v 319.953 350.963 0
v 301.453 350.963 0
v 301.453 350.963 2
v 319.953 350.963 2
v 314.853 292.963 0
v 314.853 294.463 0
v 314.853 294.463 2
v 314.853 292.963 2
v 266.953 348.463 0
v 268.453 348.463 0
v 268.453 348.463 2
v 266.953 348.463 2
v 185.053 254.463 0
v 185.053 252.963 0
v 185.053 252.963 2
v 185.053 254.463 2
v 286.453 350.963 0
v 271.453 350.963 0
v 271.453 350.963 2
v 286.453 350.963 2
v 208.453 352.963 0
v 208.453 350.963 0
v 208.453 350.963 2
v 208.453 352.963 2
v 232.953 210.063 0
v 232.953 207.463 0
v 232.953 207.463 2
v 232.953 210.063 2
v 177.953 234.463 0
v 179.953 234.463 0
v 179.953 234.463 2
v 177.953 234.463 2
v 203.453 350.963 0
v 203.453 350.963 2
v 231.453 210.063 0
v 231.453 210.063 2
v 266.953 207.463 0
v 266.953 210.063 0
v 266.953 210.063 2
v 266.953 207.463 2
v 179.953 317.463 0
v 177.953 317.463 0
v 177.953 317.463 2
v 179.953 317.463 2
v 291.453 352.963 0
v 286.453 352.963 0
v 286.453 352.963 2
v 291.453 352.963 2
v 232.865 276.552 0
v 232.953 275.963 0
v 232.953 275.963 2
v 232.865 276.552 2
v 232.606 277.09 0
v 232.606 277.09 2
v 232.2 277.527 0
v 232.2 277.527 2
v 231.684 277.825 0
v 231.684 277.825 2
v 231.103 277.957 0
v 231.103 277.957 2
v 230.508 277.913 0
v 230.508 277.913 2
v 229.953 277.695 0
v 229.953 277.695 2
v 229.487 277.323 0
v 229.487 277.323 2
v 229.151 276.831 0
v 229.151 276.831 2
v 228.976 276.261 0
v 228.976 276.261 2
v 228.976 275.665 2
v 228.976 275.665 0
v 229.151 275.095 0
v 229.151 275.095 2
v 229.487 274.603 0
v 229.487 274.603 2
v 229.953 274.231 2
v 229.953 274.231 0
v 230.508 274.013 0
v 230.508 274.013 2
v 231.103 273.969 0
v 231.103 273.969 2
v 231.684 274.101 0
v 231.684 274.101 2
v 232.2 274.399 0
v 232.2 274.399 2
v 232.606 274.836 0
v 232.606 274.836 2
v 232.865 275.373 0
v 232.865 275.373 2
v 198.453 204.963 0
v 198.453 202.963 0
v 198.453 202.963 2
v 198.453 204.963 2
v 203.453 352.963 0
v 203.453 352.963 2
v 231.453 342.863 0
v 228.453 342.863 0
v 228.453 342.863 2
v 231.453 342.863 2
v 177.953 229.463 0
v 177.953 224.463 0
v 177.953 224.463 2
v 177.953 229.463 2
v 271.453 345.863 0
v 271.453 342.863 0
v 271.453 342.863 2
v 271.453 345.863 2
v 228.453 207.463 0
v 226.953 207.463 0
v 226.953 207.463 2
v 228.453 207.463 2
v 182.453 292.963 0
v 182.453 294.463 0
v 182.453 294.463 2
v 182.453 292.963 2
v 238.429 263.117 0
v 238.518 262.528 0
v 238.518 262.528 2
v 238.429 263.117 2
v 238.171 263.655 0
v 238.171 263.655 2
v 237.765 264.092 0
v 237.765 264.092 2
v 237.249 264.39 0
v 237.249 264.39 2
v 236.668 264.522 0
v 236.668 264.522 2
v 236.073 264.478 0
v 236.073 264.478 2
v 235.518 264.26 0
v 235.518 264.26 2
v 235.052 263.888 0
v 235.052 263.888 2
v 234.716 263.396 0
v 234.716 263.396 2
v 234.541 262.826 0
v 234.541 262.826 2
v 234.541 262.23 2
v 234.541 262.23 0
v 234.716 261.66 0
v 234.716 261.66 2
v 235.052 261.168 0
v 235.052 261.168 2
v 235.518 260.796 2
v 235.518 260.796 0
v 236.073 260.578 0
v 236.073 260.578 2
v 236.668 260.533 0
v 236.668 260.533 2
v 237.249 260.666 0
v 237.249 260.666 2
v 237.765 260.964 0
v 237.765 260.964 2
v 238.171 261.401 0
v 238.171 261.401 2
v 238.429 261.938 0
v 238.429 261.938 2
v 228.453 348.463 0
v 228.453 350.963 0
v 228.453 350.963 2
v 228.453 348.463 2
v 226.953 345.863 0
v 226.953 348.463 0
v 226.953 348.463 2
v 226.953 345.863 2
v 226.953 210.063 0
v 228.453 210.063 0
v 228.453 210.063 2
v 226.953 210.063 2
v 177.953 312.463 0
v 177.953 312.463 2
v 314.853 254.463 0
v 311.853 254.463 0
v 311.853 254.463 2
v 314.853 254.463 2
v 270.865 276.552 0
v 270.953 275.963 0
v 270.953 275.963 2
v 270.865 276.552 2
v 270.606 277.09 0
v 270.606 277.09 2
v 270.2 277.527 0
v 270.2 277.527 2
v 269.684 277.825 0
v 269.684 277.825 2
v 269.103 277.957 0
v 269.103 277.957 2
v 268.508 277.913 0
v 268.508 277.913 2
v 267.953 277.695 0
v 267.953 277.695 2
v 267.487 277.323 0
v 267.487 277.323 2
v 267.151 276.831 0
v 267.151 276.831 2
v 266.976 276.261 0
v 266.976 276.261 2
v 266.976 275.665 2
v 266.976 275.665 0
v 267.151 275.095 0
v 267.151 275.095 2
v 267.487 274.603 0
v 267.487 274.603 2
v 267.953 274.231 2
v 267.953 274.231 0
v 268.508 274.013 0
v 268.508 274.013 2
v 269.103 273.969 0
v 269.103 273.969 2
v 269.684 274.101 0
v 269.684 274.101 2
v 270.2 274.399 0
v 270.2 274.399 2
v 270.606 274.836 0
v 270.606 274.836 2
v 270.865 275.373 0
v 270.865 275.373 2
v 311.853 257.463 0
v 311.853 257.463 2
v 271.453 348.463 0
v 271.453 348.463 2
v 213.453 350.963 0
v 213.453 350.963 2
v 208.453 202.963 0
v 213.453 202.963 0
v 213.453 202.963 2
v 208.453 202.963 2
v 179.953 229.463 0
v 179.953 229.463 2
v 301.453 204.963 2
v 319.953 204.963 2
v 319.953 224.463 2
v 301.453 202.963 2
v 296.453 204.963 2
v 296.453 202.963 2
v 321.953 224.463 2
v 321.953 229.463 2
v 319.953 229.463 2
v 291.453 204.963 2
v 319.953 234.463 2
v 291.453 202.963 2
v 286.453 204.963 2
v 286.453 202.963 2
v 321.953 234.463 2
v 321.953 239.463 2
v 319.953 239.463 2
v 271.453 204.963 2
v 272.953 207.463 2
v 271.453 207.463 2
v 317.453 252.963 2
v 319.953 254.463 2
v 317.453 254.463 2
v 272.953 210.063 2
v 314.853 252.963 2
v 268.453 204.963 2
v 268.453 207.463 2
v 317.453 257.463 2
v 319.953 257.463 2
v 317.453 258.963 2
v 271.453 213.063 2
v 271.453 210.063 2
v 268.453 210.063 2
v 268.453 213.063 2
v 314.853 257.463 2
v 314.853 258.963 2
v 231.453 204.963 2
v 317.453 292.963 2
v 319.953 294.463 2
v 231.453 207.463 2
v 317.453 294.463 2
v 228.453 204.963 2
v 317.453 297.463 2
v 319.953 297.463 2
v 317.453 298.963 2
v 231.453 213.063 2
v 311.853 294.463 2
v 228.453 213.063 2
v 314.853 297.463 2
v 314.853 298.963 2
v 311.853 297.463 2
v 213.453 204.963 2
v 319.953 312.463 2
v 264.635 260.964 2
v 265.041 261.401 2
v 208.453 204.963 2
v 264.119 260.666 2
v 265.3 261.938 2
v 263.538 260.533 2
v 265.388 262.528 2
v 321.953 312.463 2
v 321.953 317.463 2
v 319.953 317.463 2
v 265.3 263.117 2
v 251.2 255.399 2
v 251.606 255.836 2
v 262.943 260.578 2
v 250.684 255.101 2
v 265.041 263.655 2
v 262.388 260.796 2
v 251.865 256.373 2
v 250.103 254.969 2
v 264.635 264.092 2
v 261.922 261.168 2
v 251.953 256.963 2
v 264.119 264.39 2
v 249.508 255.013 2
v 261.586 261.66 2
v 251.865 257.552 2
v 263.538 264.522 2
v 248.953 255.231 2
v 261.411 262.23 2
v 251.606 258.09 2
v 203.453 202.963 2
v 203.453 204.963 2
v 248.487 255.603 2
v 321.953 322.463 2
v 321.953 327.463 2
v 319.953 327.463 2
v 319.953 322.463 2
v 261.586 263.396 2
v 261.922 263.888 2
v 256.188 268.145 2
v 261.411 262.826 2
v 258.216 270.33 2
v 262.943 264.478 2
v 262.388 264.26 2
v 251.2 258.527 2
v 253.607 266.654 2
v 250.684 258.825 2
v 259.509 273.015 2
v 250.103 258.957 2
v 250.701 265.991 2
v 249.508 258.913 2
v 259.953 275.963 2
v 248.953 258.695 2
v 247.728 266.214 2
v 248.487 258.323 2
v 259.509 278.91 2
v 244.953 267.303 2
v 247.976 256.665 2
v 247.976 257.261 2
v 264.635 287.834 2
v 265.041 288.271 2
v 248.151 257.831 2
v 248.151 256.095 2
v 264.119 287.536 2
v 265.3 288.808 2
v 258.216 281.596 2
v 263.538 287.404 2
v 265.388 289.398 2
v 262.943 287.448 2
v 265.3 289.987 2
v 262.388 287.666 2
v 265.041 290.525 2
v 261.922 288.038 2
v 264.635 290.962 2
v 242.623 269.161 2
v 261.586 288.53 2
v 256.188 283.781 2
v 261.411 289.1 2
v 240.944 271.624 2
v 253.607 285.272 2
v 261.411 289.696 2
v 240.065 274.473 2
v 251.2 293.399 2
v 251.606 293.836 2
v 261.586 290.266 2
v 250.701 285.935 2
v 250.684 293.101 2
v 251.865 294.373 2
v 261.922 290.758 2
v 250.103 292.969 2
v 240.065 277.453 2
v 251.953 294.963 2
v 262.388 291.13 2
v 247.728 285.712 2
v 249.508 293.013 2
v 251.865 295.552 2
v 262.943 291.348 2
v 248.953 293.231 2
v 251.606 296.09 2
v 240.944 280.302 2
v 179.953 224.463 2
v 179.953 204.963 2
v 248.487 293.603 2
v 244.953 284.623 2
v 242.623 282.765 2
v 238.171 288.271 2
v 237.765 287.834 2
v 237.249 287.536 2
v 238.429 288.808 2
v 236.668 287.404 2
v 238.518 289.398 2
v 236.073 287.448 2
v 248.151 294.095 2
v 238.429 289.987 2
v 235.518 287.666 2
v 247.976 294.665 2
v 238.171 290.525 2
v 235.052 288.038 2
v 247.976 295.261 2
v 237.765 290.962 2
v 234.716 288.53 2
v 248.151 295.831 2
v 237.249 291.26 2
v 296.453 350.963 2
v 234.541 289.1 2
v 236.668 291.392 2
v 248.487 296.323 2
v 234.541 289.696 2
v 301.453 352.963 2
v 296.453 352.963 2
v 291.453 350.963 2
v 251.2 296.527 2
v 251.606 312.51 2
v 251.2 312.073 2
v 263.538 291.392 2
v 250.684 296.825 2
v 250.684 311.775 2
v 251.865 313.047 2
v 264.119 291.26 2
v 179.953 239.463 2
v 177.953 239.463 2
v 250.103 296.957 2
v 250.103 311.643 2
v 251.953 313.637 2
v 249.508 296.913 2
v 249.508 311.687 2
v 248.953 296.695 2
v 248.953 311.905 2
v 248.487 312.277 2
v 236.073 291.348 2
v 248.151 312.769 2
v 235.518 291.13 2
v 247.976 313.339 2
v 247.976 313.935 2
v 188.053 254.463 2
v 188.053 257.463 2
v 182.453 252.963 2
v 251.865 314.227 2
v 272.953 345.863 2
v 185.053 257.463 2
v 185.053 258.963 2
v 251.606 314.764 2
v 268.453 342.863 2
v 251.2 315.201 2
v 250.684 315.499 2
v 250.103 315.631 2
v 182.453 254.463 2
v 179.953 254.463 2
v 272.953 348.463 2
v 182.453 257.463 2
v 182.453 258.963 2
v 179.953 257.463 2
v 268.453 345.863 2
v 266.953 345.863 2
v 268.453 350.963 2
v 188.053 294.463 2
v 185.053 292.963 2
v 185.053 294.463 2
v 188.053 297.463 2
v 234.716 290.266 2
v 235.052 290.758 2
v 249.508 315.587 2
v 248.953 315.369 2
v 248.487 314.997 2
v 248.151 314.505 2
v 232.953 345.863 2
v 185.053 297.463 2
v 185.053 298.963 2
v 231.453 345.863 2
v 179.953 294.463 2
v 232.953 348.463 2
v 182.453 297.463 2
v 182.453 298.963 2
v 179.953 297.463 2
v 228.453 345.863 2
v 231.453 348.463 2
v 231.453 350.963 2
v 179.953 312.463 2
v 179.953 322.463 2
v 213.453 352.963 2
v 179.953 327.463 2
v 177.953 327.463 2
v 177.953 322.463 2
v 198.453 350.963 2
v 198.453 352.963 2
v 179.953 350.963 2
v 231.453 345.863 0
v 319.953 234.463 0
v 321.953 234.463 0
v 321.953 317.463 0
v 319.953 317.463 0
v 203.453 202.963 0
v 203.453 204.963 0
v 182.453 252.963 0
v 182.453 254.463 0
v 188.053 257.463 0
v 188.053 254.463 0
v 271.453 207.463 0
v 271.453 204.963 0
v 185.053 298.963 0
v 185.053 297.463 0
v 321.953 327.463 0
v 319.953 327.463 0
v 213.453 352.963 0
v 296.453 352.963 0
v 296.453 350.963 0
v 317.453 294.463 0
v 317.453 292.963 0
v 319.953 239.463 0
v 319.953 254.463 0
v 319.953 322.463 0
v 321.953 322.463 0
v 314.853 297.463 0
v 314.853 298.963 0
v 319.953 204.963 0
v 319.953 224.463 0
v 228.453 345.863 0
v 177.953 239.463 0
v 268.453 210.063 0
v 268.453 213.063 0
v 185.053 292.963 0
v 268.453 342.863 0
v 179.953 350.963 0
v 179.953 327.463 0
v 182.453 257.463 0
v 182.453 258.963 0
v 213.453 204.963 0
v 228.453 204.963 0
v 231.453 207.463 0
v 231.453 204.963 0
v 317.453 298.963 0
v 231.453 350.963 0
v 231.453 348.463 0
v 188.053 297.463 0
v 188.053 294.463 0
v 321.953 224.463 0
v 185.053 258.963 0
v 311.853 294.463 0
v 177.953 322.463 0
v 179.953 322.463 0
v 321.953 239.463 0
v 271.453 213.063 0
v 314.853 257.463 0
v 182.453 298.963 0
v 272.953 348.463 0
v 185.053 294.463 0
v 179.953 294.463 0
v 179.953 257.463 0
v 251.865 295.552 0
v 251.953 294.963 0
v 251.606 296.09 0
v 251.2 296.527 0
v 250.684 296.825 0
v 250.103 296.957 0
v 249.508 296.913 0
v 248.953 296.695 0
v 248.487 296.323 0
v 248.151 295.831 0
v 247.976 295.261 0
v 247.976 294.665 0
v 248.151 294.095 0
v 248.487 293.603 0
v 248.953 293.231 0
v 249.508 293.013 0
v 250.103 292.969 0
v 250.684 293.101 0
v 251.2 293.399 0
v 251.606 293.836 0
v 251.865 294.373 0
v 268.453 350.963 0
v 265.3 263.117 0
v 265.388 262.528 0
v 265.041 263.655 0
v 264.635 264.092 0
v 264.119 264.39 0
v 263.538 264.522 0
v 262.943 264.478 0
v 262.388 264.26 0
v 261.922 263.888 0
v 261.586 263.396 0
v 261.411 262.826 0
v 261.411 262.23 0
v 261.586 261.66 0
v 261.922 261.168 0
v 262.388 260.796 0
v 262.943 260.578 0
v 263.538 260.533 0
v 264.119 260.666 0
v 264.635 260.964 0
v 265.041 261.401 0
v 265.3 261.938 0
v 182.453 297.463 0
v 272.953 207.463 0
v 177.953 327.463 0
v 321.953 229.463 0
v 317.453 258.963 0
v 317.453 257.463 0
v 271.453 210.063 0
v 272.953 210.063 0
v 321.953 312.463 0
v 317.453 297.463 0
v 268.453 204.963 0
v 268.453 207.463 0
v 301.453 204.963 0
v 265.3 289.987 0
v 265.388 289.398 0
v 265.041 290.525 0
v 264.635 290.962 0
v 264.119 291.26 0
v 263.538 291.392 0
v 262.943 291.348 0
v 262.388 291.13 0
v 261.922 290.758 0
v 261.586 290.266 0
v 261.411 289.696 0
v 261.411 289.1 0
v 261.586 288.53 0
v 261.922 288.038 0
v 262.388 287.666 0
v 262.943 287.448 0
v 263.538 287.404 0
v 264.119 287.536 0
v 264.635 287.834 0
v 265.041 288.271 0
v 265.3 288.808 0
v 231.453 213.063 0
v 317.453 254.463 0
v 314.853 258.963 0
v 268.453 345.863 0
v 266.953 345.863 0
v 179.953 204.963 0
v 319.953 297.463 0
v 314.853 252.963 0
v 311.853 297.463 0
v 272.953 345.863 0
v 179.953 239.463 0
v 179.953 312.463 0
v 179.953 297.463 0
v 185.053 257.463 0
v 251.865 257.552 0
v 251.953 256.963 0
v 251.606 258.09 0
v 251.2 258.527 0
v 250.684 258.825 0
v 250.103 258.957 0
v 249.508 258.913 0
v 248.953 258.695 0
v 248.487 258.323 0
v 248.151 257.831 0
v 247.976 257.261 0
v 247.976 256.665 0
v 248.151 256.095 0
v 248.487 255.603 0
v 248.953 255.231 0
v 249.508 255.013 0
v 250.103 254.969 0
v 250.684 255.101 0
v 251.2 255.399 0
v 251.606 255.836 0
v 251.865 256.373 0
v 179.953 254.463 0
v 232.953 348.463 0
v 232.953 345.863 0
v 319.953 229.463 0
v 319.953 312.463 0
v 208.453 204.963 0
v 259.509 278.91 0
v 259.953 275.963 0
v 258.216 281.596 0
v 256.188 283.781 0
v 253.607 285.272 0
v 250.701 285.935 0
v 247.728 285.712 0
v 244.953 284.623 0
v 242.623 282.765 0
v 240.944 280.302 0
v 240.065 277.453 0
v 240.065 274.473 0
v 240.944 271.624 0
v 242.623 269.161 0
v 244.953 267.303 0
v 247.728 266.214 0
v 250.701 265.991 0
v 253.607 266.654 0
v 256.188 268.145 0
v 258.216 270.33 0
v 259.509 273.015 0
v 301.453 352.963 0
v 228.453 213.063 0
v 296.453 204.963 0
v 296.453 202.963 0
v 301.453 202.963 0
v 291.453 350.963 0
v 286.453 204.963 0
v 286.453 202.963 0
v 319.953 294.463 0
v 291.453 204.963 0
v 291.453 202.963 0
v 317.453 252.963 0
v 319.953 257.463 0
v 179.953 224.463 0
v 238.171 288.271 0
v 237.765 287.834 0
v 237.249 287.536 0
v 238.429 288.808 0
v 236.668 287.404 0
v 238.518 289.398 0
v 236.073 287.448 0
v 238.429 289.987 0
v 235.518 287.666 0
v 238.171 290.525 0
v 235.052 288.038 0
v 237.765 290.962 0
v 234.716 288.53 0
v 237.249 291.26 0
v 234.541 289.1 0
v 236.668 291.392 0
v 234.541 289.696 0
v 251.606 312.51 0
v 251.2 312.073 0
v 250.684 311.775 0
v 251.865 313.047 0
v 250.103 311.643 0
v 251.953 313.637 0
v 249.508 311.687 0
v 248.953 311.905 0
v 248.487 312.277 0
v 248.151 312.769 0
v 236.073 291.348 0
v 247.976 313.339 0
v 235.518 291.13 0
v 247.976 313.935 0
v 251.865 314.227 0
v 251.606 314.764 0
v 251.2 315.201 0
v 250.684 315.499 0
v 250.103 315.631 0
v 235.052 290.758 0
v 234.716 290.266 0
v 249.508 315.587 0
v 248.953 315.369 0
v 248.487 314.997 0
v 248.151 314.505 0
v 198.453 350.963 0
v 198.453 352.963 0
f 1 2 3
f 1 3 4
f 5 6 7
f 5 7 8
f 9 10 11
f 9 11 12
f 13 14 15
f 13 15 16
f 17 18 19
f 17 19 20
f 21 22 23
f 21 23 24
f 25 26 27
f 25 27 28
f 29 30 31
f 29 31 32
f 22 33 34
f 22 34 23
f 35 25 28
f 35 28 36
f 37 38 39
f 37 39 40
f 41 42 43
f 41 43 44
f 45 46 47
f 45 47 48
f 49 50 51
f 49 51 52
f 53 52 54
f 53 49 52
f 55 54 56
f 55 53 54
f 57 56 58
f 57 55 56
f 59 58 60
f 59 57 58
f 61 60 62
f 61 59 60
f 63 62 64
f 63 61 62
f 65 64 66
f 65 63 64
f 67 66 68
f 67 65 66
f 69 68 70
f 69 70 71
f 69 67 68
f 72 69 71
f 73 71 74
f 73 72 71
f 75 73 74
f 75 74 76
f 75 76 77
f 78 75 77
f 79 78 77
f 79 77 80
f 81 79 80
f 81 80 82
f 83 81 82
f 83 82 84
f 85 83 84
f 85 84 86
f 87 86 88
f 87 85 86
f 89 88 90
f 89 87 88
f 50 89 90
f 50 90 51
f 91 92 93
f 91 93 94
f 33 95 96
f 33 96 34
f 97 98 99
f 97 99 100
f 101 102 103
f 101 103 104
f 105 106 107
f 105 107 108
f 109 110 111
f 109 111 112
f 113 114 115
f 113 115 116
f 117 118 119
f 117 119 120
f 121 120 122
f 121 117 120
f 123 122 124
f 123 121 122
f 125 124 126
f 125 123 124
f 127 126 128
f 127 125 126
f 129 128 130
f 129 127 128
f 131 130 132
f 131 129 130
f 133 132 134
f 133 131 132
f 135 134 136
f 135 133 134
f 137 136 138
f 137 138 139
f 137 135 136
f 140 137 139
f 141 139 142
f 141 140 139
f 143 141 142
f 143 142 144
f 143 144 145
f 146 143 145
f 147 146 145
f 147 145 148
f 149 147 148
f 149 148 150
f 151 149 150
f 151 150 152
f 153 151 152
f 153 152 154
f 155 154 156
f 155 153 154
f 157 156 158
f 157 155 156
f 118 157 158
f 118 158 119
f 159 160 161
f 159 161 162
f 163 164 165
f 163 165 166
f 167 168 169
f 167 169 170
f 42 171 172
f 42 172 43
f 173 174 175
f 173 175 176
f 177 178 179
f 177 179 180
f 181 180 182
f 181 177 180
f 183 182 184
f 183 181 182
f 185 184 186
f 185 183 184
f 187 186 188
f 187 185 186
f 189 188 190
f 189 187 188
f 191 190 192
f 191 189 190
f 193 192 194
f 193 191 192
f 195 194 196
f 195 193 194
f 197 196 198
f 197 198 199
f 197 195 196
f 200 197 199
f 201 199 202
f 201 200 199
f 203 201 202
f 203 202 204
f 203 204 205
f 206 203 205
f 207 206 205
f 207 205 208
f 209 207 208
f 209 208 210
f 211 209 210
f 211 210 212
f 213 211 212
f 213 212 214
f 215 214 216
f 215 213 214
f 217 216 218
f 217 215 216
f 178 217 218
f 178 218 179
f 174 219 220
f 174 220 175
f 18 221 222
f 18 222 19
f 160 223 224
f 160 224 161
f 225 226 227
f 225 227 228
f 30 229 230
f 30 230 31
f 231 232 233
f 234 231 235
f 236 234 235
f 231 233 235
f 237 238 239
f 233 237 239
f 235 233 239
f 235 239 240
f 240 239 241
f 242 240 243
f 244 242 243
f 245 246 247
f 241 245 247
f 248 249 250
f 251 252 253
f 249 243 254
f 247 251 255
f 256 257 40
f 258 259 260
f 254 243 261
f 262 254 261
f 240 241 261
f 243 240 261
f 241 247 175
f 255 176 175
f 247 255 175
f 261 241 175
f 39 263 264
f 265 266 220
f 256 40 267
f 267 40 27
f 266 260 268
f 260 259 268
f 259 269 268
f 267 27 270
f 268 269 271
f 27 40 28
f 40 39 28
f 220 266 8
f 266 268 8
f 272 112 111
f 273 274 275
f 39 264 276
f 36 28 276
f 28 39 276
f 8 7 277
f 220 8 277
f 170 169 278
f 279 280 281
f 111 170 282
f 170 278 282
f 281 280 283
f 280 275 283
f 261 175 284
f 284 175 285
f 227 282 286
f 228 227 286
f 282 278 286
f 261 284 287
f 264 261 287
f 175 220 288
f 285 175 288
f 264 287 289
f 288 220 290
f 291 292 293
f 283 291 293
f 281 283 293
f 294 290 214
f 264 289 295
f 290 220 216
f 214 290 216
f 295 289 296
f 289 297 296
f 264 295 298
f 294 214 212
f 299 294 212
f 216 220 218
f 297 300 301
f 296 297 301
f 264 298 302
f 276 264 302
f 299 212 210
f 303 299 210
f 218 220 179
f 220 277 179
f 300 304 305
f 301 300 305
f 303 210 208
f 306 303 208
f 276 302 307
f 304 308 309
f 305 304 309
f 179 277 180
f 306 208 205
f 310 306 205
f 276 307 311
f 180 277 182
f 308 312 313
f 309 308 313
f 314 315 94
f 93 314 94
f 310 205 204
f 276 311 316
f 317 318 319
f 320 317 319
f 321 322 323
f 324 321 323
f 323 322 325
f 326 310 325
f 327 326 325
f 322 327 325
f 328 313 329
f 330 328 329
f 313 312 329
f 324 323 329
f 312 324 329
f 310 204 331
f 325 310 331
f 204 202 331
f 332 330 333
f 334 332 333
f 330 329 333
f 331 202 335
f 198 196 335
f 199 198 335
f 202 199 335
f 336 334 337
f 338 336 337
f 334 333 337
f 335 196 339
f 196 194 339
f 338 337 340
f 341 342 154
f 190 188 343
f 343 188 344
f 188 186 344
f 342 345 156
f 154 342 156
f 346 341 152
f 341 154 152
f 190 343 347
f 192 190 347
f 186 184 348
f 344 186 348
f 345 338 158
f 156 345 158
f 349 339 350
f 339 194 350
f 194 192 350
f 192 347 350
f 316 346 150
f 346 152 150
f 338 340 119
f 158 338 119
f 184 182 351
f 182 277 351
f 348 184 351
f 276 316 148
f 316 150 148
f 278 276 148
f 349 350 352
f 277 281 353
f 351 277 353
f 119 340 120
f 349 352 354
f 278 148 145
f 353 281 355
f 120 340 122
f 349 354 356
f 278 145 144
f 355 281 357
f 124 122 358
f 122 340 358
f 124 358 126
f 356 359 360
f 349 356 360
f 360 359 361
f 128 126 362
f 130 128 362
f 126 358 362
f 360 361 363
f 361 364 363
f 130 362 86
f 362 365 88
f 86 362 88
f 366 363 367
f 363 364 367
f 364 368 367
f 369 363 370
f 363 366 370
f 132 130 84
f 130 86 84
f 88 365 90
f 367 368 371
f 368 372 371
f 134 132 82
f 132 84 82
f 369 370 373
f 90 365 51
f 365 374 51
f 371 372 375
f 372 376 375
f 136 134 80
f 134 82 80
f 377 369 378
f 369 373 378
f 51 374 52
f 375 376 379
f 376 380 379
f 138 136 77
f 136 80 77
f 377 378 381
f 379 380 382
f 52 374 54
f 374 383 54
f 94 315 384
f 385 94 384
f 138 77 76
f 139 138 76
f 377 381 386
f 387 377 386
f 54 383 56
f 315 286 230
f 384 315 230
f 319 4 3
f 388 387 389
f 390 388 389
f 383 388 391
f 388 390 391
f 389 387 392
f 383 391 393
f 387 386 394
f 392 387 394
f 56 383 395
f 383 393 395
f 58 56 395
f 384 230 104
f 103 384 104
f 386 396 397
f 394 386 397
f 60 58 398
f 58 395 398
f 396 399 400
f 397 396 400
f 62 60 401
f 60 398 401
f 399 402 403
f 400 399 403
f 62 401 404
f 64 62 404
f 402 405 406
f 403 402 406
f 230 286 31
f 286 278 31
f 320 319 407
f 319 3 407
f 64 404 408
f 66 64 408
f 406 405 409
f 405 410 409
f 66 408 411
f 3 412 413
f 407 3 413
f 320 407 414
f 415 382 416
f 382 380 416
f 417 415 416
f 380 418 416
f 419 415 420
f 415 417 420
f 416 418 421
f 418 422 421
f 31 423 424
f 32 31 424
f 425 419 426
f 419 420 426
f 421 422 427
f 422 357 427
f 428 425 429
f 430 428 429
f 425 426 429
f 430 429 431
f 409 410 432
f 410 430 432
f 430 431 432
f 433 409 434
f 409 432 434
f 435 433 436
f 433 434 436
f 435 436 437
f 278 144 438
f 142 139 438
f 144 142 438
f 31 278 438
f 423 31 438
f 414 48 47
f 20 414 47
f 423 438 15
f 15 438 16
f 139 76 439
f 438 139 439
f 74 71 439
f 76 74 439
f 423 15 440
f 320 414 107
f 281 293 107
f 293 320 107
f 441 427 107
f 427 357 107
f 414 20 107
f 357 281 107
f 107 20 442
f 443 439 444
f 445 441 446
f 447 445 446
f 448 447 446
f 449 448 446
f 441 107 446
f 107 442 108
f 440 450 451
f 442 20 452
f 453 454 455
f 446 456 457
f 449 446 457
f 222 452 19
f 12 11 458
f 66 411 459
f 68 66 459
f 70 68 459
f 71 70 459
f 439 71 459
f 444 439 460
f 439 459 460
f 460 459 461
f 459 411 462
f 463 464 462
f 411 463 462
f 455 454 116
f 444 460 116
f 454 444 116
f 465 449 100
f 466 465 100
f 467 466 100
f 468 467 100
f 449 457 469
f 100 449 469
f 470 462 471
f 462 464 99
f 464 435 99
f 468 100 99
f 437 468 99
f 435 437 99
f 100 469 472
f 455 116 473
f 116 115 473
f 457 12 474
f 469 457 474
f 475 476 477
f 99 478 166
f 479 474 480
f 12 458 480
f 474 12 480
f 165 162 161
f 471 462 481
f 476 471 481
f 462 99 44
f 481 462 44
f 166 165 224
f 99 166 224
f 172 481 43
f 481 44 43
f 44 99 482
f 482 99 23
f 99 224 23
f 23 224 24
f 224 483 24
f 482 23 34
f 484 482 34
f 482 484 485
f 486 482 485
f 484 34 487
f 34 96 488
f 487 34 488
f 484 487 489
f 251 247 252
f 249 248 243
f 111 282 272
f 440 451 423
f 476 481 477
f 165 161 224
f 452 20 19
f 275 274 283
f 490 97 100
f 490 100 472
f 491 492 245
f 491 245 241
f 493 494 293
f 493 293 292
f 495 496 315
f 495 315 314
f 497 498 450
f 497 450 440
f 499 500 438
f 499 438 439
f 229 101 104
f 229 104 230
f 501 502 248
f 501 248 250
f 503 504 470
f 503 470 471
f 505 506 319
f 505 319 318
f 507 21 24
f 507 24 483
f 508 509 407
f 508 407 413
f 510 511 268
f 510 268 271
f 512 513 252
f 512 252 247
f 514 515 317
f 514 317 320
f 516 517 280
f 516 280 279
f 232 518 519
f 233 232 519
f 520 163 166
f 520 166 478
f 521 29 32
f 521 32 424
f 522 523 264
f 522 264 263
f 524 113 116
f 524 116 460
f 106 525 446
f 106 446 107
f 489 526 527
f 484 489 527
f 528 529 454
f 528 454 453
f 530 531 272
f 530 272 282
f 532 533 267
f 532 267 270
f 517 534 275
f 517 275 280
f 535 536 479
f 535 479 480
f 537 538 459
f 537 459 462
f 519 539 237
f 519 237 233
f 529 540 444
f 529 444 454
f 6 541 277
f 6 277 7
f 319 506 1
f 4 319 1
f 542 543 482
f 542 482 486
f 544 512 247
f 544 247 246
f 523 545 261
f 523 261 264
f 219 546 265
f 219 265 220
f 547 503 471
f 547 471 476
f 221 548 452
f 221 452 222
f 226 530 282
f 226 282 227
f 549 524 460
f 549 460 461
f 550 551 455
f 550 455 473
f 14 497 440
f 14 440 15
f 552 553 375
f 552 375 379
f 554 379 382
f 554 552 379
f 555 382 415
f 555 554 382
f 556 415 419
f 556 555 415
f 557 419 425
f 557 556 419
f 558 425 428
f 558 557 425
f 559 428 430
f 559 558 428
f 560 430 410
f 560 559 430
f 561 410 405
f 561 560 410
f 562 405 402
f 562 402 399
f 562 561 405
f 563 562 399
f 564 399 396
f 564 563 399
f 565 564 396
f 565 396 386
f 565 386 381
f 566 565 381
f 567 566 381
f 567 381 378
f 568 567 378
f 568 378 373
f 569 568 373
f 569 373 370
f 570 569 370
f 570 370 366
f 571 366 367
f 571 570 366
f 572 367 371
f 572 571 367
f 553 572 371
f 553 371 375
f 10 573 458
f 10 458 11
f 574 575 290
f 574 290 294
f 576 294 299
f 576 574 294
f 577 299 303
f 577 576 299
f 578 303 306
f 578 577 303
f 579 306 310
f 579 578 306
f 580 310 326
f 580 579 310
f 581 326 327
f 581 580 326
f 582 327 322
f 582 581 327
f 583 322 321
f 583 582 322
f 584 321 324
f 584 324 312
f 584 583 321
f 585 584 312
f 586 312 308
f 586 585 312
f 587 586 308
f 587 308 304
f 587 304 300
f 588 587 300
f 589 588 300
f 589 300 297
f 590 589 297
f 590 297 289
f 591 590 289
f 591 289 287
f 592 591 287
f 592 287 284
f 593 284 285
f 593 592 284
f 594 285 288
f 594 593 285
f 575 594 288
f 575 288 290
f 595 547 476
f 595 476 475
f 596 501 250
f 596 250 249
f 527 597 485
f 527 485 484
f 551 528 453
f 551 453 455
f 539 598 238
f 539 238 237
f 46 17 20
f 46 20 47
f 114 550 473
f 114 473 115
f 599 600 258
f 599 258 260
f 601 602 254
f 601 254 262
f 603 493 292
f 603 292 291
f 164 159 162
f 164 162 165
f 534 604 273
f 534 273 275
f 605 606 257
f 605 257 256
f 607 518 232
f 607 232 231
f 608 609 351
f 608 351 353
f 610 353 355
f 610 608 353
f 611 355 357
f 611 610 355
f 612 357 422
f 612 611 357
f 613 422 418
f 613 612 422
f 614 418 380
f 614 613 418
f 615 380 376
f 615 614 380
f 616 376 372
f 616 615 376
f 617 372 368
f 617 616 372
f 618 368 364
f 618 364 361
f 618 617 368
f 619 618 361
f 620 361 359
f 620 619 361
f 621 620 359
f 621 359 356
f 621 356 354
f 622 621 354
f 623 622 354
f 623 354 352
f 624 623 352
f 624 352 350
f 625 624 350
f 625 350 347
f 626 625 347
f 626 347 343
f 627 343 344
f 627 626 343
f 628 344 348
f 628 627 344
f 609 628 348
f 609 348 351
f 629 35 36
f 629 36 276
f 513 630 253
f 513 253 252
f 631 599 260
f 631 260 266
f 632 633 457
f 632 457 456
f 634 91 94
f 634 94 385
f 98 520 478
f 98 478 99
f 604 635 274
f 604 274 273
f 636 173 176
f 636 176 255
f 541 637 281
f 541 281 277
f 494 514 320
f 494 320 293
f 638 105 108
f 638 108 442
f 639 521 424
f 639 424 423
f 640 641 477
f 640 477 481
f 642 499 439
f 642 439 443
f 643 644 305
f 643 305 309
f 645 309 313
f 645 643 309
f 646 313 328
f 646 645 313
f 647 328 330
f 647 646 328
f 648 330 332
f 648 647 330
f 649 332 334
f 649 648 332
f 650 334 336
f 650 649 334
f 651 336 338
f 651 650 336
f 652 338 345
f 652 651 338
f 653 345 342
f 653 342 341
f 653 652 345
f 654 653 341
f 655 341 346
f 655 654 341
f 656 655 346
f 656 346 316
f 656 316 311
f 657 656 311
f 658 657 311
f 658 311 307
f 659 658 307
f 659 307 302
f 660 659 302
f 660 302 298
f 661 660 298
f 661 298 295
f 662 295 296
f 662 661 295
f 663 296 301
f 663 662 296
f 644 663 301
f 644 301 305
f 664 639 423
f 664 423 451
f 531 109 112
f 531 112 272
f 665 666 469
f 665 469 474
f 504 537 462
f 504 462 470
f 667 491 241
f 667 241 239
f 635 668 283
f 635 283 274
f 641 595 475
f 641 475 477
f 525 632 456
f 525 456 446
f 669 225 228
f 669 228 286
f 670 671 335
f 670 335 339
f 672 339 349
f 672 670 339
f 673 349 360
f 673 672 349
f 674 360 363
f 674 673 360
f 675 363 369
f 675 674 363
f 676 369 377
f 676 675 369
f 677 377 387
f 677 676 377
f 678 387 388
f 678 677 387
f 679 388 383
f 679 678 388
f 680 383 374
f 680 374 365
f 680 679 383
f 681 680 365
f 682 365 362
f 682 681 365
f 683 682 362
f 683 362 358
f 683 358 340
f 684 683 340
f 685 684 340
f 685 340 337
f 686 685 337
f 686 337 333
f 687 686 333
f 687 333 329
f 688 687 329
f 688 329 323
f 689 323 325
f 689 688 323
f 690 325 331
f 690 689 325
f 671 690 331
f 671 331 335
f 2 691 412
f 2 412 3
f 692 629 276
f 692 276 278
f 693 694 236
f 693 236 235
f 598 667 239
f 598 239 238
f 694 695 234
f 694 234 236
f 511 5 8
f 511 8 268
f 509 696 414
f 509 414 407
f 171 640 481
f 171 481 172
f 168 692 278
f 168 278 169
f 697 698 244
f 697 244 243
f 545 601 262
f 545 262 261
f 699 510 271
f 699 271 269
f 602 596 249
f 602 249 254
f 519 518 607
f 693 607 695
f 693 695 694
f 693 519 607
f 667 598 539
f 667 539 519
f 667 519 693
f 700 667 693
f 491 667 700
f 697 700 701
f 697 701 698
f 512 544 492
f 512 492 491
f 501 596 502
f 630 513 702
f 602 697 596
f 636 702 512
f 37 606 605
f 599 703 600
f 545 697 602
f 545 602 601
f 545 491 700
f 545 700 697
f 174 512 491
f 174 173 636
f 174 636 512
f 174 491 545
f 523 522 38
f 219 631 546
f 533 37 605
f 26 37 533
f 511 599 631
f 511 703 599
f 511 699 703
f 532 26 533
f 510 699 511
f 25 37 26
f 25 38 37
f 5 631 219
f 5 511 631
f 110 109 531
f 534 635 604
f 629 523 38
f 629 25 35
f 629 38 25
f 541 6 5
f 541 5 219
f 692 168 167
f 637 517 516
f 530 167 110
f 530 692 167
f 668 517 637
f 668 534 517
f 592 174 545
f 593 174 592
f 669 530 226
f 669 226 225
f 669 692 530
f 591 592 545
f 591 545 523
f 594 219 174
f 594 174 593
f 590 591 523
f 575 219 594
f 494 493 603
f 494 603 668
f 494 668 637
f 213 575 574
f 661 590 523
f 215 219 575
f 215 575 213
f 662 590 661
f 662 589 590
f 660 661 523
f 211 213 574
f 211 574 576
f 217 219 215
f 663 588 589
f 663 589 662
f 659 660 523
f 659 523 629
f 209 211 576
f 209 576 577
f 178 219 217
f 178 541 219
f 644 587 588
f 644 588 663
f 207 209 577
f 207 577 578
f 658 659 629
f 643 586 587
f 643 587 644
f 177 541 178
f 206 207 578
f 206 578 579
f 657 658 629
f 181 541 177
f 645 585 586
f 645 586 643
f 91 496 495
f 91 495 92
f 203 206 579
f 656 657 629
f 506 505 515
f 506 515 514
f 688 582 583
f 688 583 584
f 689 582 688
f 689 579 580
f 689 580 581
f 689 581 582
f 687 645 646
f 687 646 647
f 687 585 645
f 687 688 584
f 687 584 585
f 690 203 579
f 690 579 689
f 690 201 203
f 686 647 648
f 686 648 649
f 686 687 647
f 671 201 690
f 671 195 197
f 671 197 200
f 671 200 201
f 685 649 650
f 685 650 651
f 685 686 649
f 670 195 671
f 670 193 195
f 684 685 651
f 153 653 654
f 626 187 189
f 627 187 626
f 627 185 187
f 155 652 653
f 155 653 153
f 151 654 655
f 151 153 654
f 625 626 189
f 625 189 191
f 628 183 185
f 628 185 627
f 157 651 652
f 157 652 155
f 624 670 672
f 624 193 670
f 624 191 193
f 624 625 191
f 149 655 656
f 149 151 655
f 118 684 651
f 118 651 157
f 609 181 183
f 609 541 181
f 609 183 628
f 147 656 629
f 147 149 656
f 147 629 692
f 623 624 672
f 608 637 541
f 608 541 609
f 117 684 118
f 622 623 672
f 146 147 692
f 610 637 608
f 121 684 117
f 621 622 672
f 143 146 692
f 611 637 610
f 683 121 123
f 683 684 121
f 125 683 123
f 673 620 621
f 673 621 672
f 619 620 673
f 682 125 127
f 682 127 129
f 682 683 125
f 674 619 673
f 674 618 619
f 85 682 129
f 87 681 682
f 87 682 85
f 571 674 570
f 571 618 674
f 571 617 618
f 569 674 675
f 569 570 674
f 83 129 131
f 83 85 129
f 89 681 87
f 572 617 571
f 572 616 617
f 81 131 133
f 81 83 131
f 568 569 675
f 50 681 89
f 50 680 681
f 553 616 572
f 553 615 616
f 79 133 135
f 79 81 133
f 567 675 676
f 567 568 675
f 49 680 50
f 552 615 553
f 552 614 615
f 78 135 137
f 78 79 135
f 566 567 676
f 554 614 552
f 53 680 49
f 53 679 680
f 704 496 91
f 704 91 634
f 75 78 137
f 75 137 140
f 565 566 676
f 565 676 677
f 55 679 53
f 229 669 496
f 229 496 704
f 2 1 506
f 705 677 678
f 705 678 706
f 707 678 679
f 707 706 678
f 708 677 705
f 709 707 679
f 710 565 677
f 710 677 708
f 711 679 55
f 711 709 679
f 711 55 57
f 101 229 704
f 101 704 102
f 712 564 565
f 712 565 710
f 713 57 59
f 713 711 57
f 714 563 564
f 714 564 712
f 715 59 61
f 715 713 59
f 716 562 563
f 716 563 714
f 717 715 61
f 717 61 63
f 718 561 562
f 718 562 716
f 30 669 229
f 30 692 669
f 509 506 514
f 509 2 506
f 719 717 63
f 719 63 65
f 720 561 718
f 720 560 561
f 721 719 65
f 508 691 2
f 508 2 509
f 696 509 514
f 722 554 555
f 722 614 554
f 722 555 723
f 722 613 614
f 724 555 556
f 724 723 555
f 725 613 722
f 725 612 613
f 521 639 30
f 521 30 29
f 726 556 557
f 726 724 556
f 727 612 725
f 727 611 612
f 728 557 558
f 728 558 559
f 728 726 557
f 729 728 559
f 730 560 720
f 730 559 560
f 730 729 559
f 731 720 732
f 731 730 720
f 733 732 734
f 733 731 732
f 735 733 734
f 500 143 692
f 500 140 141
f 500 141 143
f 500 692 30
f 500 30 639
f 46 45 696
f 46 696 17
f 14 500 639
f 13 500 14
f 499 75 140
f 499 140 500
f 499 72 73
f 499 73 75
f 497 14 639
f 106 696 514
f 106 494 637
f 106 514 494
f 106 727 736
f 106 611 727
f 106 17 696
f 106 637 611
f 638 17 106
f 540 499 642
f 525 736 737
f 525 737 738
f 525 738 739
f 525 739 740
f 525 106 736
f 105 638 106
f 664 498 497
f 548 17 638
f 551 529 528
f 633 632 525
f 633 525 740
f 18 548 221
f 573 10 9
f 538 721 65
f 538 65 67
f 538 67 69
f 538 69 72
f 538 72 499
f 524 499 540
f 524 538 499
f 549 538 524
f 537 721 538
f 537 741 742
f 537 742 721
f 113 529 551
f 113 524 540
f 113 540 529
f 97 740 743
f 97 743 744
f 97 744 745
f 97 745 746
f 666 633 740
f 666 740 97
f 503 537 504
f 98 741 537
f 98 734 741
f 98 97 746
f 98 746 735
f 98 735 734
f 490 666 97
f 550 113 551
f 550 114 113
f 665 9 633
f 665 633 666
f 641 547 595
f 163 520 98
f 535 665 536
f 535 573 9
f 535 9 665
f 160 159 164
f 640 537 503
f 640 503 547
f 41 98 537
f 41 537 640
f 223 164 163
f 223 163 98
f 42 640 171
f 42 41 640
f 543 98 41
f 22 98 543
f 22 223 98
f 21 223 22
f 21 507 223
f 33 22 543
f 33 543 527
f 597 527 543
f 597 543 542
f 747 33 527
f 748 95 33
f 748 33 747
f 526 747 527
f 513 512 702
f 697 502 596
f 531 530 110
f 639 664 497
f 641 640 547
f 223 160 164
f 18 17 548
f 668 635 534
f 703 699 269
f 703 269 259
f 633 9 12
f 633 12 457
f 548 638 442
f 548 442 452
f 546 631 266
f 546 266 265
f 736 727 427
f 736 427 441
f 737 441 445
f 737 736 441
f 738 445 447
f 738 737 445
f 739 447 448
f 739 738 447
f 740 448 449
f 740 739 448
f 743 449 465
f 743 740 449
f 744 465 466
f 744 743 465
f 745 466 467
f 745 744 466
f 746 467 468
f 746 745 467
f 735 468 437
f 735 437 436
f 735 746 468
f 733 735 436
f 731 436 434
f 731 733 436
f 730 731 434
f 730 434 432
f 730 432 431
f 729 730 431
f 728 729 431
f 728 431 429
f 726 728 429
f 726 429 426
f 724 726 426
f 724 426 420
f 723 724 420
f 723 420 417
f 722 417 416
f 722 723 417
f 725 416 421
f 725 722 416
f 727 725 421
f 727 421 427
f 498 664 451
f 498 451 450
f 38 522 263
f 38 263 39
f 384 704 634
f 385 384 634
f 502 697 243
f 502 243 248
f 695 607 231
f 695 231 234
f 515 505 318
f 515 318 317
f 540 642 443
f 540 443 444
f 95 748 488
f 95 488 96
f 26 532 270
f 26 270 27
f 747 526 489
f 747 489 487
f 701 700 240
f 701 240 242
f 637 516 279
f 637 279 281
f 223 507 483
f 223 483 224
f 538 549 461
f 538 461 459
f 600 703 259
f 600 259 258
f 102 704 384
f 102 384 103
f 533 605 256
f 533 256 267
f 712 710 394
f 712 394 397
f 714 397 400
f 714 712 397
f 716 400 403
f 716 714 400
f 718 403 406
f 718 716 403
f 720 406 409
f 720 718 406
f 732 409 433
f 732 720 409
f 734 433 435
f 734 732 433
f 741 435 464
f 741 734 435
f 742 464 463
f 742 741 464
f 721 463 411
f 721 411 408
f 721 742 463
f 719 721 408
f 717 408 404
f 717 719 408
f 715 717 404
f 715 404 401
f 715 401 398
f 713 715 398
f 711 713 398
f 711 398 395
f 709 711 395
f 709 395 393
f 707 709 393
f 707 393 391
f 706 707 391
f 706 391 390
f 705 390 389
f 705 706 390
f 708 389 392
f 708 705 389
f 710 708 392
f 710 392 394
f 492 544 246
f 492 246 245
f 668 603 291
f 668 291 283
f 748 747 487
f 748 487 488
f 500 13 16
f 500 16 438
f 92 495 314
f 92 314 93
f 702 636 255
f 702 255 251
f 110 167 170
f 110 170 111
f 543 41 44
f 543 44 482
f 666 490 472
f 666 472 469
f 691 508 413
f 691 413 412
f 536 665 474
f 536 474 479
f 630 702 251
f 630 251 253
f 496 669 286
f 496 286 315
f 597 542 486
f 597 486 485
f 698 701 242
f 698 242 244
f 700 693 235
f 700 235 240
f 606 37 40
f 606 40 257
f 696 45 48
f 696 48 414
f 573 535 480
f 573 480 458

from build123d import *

# Parameters (mm, degrees)
SKETCH_1_R      = 10
SKETCH_1_R_2    = 2
EXTRUDE_1_DEPTH = 2


with BuildPart() as part:
    # 草图1 → 凸台-拉伸1 (new body)
    with BuildSketch(Plane.XY):
        Polygon((317.453360513, 257.462931603), (317.453360513, 258.962931602), (314.853360513, 258.962931602), (314.853360513, 257.462931603), (311.853360513, 257.462931603), (311.853360513, 254.462931603), (314.853360513, 254.462931603), (314.853360513, 252.962931603), (317.453360513, 252.962931603), (317.453360513, 254.462931603), (319.953360513, 254.462931603), (319.953360513, 239.462931603), (321.953360513, 239.462931603), (321.953360513, 234.462931603), (319.953360513, 234.462931603), (319.953360513, 229.462931603), (321.953360513, 229.462931603), (321.953360513, 224.462931603), (319.953360513, 224.462931603), (319.953360513, 219.462931603), (319.953360513, 204.962931603), (301.453360513, 204.962931603), (301.453360513, 202.962931603), (296.453360513, 202.962931603), (296.453360513, 204.962931603), (291.453360513, 204.962931603), (291.453360513, 202.962931603), (286.453360513, 202.962931603), (286.453360513, 204.962931603), (271.453360513, 204.962931603), (271.453360513, 207.462931603), (272.953360513, 207.462931603), (272.953360513, 210.062931603), (271.453360513, 210.062931603), (271.453360513, 213.062931603), (268.453360513, 213.062931603), (268.453360513, 210.062931603), (266.953360513, 210.062931603), (266.953360513, 207.462931603), (268.453360513, 207.462931603), (268.453360513, 204.962931603), (231.453360513, 204.962931603), (231.453360513, 207.462931603), (232.953360513, 207.462931603), (232.953360513, 210.062931603), (231.453360513, 210.062931603), (231.453360513, 213.062931603), (228.453360513, 213.062931603), (228.453360513, 210.062931603), (226.953360513, 210.062931603), (226.953360513, 207.462931603), (228.453360513, 207.462931603), (228.453360513, 204.962931603), (213.453360513, 204.962931603), (213.453360513, 202.962931603), (208.453360513, 202.962931603), (208.453360513, 204.962931603), (203.453360513, 204.962931603), (203.453360513, 202.962931603), (198.453360513, 202.962931603), (198.453360513, 204.962931603), (179.953360513, 204.962931603), (179.953360513, 219.462931603), (179.953360513, 224.462931603), (177.953360513, 224.462931603), (177.953360513, 229.462931603), (179.953360513, 229.462931603), (179.953360513, 234.462931603), (177.953360513, 234.462931603), (177.953360513, 239.462931603), (179.953360513, 239.462931603), (179.953360513, 254.462931603), (182.453360513, 254.462931603), (182.453360513, 252.962931603), (185.053360513, 252.962931603), (185.053360513, 254.462931603), (188.053360513, 254.462931603), (188.053360513, 257.462931603), (185.053360513, 257.462931603), (185.053360513, 258.962931602), (182.453360513, 258.962931602), (182.453360513, 257.462931603), (179.953360513, 257.462931603), (179.953360513, 294.462931603), (182.453360513, 294.462931603), (182.453360513, 292.962931603), (185.053360513, 292.962931603), (185.053360513, 294.462931603), (188.053360513, 294.462931603), (188.053360513, 297.462931603), (185.053360513, 297.462931603), (185.053360513, 298.962931603), (182.453360513, 298.962931603), (182.453360513, 297.462931603), (179.953360513, 297.462931603), (179.953360513, 312.462931602), (177.953360513, 312.462931602), (177.953360513, 317.462931602), (179.953360513, 317.462931602), (179.953360513, 322.462931603), (177.953360513, 322.462931603), (177.953360513, 327.462931603), (179.953360513, 327.462931603), (179.953360513, 332.462931603), (179.953360513, 350.962931603), (198.453360513, 350.962931603), (198.453360513, 352.962931603), (203.453360513, 352.962931603), (203.453360513, 350.962931603), (208.453360513, 350.962931603), (208.453360513, 352.962931603), (213.453360513, 352.962931603), (213.453360513, 350.962931603), (228.453360513, 350.962931603), (228.453360513, 348.462931603), (226.953360513, 348.462931603), (226.953360513, 345.862931603), (228.453360513, 345.862931603), (228.453360513, 342.862931603), (231.453360513, 342.862931603), (231.453360513, 345.862931603), (232.953360513, 345.862931603), (232.953360513, 348.462931603), (231.453360513, 348.462931603), (231.453360513, 350.962931603), (268.453360513, 350.962931603), (268.453360513, 348.462931603), (266.953360513, 348.462931603), (266.953360513, 345.862931603), (268.453360513, 345.862931603), (268.453360513, 342.862931603), (271.453360513, 342.862931603), (271.453360513, 345.862931603), (272.953360513, 345.862931603), (272.953360513, 348.462931603), (271.453360513, 348.462931603), (271.453360513, 350.962931603), (286.453360513, 350.962931603), (286.453360513, 352.962931603), (291.453360513, 352.962931603), (291.453360513, 350.962931603), (296.453360513, 350.962931603), (296.453360513, 352.962931603), (301.453360513, 352.962931603), (301.453360513, 350.962931603), (319.953360513, 350.962931603), (319.953360513, 332.462931603), (319.953360513, 327.462931603), (321.953360513, 327.462931603), (321.953360513, 322.462931603), (319.953360513, 322.462931603), (319.953360513, 317.462931602), (321.953360513, 317.462931602), (321.953360513, 312.462931602), (319.953360513, 312.462931602), (319.953360513, 297.462931603), (317.453360513, 297.462931603), (317.453360513, 298.962931603), (314.853360513, 298.962931603), (314.853360513, 297.462931603), (311.853360513, 297.462931603), (311.853360513, 294.462931603), (314.853360513, 294.462931603), (314.853360513, 292.962931603), (317.453360513, 292.962931603), (317.453360513, 294.462931603), (319.953360513, 294.462931603), (319.953360513, 257.462931603), align=None)
        with Locations((249.953360513, 275.962931603)):
            Circle(SKETCH_1_R, mode=Mode.SUBTRACT)
        with Locations((230.953360513, 275.962931603)):
            Circle(SKETCH_1_R_2, mode=Mode.SUBTRACT)
        with Locations((236.518331671, 289.397960445)):
            Circle(SKETCH_1_R_2, mode=Mode.SUBTRACT)
        with Locations((249.953360513, 294.962931603)):
            Circle(SKETCH_1_R_2, mode=Mode.SUBTRACT)
        with Locations((263.388389356, 289.397960445)):
            Circle(SKETCH_1_R_2, mode=Mode.SUBTRACT)
        with Locations((268.953360513, 275.962931603)):
            Circle(SKETCH_1_R_2, mode=Mode.SUBTRACT)
        with Locations((263.388389356, 262.52790276)):
            Circle(SKETCH_1_R_2, mode=Mode.SUBTRACT)
        with Locations((249.953360513, 256.962931603)):
            Circle(SKETCH_1_R_2, mode=Mode.SUBTRACT)
        with Locations((236.518331671, 262.52790276)):
            Circle(SKETCH_1_R_2, mode=Mode.SUBTRACT)
        with Locations((249.953360513, 313.636994259)):
            Circle(SKETCH_1_R_2, mode=Mode.SUBTRACT)
    extrude(amount=EXTRUDE_1_DEPTH)


solid = part.part
